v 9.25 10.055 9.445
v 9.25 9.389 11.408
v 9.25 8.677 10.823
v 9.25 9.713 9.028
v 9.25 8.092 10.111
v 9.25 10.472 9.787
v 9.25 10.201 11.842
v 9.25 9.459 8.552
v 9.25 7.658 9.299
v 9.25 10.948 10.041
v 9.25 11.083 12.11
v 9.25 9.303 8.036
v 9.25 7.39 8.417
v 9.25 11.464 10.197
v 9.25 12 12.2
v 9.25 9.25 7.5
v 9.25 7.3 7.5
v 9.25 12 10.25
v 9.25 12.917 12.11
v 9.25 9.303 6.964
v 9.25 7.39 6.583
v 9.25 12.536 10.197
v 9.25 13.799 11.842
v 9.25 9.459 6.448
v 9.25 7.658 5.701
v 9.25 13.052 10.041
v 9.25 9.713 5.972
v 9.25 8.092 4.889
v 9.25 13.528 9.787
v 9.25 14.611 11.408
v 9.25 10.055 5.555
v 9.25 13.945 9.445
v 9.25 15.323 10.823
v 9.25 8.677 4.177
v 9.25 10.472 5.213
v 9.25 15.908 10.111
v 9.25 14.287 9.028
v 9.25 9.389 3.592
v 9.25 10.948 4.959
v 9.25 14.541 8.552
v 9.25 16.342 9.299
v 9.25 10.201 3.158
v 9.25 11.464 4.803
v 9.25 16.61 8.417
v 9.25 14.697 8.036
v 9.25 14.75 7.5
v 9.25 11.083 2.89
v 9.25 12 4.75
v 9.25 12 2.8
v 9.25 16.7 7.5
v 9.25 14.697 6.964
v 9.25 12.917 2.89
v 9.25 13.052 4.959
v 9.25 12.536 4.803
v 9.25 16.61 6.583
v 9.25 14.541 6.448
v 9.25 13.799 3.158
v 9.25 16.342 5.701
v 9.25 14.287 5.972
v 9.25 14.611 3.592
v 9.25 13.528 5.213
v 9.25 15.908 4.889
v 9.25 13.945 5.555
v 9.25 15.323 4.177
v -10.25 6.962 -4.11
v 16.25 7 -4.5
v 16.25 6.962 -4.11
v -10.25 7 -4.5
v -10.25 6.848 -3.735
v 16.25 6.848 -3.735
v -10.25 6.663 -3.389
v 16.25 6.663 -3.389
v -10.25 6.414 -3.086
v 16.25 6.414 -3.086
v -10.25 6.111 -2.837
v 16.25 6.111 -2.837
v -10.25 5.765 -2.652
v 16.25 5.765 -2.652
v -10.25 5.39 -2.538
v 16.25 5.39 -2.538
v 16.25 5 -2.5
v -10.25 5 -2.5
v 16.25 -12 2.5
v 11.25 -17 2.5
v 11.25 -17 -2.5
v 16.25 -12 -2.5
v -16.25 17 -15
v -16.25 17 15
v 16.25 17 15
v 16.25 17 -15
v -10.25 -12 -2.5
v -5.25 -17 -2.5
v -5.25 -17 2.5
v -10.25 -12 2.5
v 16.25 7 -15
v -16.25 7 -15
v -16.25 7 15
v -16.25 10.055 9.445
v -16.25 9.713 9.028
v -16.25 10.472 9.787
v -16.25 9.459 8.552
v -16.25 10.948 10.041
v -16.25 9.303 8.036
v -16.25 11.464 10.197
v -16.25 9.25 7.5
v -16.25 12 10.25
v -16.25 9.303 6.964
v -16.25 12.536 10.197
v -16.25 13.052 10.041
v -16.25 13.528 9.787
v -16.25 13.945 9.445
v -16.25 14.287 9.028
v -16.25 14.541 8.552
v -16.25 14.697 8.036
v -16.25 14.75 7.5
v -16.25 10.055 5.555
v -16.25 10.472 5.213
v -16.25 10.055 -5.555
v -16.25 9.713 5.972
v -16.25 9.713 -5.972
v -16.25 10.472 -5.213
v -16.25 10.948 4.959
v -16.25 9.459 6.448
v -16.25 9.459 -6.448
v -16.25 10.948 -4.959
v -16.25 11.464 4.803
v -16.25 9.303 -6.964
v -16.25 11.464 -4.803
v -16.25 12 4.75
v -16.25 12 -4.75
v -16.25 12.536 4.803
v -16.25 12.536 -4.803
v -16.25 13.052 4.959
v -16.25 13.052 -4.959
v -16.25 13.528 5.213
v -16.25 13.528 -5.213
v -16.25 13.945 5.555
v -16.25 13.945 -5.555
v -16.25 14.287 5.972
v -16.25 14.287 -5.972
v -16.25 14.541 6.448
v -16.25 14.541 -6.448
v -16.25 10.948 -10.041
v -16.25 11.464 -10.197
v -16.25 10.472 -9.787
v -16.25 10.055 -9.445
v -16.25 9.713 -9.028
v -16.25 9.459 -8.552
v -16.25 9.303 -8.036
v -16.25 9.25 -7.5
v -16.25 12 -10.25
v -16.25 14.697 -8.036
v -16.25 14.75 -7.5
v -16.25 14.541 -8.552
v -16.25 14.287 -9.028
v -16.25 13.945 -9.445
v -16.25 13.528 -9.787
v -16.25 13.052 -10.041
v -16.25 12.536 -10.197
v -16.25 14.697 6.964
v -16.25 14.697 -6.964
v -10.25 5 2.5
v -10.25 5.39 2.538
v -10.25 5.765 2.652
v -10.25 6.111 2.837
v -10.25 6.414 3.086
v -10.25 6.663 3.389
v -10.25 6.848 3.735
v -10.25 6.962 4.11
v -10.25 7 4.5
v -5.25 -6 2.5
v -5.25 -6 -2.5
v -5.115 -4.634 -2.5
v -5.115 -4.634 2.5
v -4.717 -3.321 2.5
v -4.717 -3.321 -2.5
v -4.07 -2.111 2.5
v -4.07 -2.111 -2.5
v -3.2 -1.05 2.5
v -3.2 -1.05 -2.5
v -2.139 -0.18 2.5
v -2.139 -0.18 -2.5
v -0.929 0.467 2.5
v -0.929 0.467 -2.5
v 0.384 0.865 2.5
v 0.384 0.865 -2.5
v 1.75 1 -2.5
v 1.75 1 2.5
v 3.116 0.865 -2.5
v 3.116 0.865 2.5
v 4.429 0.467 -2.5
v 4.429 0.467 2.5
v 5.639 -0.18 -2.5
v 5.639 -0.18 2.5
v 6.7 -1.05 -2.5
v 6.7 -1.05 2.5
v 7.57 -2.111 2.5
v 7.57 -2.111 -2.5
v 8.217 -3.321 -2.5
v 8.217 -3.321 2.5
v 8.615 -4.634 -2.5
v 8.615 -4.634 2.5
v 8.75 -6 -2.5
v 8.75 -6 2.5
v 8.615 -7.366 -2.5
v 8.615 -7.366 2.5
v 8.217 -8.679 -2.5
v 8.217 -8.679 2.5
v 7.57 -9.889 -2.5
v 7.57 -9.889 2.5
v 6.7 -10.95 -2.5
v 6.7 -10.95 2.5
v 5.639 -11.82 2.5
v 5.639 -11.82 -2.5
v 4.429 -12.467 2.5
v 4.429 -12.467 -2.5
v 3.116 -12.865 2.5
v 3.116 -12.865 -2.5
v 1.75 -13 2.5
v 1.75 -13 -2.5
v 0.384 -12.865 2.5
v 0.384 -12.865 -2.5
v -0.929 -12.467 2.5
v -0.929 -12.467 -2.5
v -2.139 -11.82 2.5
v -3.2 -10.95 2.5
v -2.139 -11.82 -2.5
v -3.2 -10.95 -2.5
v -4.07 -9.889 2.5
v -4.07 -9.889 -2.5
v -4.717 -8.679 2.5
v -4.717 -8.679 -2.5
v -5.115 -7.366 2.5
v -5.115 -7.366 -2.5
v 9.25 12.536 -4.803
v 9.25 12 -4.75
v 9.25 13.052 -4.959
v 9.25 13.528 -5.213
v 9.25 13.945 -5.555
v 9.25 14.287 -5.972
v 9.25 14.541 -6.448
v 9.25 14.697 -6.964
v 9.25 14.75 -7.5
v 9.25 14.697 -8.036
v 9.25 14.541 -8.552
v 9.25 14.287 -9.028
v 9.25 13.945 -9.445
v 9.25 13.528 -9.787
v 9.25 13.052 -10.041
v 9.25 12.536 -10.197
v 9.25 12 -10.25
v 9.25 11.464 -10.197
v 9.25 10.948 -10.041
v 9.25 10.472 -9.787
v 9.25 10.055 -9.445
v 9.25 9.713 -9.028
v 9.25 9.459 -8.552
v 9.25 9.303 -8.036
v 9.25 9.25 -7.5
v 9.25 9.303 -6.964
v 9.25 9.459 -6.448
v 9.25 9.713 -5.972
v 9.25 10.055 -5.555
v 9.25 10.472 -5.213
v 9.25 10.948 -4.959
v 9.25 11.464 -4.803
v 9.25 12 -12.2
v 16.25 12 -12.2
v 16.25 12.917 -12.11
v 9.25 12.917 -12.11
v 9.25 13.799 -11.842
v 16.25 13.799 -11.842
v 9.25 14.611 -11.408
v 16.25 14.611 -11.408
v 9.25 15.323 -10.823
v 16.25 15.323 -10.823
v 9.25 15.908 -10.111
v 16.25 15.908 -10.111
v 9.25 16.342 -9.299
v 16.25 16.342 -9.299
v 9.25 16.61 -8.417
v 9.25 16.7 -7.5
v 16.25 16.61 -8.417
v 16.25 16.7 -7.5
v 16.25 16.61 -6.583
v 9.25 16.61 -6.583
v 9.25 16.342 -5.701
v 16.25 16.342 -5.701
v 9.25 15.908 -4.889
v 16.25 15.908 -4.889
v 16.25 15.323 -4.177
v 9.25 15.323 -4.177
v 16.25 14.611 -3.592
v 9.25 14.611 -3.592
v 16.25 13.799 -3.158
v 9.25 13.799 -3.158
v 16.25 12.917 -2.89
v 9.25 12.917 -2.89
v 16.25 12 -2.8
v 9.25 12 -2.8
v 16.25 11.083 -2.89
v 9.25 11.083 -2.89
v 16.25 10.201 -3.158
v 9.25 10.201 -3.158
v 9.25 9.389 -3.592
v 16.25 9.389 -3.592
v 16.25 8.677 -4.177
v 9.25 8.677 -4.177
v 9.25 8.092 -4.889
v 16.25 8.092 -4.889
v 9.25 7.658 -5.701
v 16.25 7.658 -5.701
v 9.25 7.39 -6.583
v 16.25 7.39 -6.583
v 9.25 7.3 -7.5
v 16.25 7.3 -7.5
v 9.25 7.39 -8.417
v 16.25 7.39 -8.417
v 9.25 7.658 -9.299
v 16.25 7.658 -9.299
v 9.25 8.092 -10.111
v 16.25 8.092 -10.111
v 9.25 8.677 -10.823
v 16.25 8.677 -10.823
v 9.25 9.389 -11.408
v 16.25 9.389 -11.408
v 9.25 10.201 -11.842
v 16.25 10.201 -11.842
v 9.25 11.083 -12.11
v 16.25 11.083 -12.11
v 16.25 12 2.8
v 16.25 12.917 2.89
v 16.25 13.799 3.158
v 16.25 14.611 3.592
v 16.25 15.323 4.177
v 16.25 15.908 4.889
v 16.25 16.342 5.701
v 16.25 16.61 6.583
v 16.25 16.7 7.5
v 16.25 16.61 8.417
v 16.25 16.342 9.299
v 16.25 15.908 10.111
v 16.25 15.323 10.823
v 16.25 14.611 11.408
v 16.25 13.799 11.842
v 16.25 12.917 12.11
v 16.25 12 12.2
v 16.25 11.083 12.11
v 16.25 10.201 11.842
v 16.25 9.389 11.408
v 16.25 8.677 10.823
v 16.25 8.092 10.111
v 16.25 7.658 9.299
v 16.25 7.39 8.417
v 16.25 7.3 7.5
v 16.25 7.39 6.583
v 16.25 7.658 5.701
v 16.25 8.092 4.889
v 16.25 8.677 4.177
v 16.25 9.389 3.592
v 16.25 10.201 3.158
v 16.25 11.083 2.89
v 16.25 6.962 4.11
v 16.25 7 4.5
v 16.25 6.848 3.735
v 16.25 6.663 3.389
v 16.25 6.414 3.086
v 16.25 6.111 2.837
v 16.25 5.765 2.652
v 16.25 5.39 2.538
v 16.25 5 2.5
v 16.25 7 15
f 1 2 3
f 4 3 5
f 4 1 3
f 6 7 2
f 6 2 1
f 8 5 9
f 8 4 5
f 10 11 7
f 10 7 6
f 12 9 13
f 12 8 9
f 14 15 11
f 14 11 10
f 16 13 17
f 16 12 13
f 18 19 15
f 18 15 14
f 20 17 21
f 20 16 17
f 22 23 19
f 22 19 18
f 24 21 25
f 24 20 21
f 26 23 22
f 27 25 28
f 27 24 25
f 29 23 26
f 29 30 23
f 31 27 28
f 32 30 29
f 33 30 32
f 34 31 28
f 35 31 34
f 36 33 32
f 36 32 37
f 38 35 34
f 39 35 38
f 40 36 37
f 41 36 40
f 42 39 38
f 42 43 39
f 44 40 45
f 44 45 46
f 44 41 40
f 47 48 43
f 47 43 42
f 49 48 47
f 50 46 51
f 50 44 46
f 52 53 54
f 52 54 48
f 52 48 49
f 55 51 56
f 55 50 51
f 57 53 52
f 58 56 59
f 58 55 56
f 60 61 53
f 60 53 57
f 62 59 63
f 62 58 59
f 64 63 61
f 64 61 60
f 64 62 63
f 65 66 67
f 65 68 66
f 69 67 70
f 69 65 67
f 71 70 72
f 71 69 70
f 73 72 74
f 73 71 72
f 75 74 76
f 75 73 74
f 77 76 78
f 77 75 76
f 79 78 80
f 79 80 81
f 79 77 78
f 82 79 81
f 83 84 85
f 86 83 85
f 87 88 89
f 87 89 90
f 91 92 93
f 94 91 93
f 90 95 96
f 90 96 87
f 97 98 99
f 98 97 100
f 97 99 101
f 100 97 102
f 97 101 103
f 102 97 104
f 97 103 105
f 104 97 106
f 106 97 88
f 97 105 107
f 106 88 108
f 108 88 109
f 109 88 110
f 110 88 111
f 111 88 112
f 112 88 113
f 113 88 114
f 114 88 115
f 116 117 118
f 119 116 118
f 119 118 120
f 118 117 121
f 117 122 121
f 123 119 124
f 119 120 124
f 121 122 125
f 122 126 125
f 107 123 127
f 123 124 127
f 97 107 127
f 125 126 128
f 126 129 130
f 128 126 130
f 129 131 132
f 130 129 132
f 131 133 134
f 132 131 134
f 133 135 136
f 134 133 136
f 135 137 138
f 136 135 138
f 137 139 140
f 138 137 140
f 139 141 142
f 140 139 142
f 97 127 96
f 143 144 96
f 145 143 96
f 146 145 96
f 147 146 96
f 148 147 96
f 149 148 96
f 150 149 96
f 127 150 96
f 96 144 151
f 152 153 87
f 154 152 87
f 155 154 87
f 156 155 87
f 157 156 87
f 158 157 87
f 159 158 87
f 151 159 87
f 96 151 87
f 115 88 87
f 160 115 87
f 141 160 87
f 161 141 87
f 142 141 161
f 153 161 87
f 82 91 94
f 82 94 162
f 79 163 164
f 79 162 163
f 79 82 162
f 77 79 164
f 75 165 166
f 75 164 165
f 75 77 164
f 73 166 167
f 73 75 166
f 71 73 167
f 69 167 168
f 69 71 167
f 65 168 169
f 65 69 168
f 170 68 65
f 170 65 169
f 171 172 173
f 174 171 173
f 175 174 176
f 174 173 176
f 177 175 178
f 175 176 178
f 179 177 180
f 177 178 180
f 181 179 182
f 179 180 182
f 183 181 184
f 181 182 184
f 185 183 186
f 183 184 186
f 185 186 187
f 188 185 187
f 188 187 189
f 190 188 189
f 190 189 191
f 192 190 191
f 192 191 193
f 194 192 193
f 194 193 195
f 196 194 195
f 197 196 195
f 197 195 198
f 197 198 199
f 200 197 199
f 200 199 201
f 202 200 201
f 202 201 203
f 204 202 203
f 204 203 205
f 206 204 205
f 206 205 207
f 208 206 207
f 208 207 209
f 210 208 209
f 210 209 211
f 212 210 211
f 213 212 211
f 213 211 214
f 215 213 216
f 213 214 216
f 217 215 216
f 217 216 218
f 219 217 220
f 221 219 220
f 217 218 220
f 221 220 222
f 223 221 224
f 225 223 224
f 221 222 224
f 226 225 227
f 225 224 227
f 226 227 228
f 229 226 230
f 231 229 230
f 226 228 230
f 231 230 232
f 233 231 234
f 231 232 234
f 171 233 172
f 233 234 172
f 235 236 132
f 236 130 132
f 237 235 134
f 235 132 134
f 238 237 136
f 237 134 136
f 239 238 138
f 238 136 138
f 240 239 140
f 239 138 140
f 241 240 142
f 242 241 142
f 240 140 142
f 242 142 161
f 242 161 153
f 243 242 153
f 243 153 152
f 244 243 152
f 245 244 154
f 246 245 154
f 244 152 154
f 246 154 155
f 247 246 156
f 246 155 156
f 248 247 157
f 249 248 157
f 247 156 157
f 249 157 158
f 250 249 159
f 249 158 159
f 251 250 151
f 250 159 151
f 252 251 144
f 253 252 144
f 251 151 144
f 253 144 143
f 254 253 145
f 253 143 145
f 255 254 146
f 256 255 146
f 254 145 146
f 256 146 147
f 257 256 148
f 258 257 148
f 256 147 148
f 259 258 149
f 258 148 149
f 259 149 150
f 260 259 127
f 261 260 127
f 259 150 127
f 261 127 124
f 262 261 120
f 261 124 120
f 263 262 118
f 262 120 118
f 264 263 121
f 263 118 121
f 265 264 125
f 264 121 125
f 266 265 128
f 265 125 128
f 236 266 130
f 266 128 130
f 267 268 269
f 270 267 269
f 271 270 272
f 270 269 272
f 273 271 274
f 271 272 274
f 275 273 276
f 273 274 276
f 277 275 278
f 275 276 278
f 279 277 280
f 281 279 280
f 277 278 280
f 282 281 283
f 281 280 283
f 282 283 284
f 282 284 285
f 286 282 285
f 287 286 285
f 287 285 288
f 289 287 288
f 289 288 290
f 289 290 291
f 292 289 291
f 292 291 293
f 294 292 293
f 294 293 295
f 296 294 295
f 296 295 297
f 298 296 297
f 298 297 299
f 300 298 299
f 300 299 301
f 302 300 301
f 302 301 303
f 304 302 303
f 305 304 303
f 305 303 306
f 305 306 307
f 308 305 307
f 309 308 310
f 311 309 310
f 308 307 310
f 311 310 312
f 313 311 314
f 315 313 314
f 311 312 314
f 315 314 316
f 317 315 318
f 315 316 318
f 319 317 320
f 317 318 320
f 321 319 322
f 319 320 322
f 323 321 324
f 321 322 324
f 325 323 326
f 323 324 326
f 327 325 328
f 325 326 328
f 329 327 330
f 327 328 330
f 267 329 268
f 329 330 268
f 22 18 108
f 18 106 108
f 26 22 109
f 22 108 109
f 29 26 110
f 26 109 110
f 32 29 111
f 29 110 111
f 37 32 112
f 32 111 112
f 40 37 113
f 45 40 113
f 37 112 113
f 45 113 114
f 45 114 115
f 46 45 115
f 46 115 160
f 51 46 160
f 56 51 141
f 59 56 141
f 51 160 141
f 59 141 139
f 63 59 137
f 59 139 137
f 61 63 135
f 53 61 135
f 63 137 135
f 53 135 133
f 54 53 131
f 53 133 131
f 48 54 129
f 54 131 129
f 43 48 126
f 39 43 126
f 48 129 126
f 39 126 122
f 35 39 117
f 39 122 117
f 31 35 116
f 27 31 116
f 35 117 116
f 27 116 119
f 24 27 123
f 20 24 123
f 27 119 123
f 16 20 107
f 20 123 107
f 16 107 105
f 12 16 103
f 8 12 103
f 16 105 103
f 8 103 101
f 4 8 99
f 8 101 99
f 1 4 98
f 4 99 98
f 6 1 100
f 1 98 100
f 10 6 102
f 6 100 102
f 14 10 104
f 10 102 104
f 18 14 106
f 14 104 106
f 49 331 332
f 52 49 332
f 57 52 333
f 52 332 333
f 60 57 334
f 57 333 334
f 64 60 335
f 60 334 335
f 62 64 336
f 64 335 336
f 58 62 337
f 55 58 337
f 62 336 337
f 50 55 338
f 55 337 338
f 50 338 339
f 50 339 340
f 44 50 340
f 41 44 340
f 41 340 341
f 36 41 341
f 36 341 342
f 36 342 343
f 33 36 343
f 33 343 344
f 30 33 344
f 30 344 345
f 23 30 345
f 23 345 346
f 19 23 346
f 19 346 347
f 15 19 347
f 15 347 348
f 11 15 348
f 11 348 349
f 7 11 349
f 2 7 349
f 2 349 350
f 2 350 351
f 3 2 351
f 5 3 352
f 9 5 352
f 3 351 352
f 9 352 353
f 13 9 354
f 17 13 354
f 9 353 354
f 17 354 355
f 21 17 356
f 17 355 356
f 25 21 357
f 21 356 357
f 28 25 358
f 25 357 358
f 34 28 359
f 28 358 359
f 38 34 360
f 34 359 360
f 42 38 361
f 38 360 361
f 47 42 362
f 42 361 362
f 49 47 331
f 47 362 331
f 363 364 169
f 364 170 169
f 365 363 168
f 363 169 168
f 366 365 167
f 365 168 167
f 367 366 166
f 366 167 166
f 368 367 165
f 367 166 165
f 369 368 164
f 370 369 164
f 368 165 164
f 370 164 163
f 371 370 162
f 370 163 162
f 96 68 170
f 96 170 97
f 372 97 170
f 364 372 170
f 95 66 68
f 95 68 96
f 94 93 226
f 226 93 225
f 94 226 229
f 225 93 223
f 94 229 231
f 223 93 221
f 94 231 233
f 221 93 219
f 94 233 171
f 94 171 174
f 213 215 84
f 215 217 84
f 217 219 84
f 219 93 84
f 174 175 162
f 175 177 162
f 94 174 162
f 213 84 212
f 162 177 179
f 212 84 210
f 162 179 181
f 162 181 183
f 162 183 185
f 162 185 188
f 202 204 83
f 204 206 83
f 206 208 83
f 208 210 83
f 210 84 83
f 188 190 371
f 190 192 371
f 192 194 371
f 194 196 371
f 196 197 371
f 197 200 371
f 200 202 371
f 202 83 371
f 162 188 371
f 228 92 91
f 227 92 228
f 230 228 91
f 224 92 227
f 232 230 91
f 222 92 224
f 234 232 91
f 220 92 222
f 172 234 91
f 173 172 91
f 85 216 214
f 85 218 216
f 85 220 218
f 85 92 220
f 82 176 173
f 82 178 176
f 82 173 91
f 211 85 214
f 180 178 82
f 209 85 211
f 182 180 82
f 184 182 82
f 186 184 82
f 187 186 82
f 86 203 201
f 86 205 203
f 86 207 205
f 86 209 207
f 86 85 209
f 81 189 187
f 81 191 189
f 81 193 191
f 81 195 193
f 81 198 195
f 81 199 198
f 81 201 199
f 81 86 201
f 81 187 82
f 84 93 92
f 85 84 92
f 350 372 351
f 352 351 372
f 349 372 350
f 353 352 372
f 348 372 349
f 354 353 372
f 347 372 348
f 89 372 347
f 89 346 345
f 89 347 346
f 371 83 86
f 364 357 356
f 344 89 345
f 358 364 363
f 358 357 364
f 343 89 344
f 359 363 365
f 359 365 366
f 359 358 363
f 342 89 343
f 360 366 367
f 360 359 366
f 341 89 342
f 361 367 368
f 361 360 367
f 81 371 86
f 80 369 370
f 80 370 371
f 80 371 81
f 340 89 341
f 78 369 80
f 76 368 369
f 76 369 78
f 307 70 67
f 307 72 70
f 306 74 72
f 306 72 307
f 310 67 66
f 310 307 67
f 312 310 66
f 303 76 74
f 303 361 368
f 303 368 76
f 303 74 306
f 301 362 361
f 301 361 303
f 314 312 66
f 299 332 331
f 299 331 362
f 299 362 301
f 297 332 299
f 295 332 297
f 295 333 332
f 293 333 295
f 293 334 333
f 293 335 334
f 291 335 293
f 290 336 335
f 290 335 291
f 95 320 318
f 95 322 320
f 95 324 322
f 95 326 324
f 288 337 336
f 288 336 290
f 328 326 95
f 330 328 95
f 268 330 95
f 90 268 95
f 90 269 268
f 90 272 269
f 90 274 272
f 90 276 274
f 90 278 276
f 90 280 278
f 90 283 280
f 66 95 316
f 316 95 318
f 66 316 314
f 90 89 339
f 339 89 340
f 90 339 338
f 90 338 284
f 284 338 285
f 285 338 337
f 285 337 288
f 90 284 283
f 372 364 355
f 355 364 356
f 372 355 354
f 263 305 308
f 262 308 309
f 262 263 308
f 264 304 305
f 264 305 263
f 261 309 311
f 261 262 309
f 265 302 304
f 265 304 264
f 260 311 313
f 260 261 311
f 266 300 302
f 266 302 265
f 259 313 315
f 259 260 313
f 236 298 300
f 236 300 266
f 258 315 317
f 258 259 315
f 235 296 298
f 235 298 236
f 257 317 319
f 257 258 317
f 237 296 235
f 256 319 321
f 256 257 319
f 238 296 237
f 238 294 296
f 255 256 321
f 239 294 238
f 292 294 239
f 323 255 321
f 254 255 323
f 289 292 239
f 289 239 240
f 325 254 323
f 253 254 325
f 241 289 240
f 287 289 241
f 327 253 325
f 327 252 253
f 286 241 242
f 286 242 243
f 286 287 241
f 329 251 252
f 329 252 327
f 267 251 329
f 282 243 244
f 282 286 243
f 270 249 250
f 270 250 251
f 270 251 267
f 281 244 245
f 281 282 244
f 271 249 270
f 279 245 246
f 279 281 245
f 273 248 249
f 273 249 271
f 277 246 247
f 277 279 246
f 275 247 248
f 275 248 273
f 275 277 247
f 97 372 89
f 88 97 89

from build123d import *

# Parameters (mm, degrees)
SKETCH_1_W                  = 30
SKETCH_1_H                  = 34
EXTRUDE_1_DEPTH             = 16.25
SKETCH_2_W                  = 12.5
SKETCH_2_H                  = 24
CUT_EXTRUDE_1_DEPTH         = 40.626380102
SKETCH_5_W                  = 6
SKETCH_5_H                  = 24
CUT_EXTRUDE_2_DEPTH         = 49.521258228
HOLE_WIZARD_1_D             = 14
HOLE_WIZARD_1_2_D           = 5.5
HOLE_WIZARD_1_2_CBORE_D     = 9.4
HOLE_WIZARD_1_2_CBORE_DEPTH = 7
FILLET_1_R                  = 2
CHAMFER_1_SIZE              = 5


with BuildPart() as part:
    # 草图1 → 凸台-拉伸1 (new, symmetric)
    with BuildSketch(Plane(origin=(0, 0, 0), x_dir=(0, 0, -1), z_dir=(1, 0, 0))):
        Rectangle(SKETCH_1_W, SKETCH_1_H)
    extrude(amount=EXTRUDE_1_DEPTH, both=True)

    # 草图2 → 切除-拉伸1 (cut, through all)
    with BuildSketch(Plane(origin=(16.25, 0, 0), x_dir=(0, 0, -1), z_dir=(1, 0, 0))):
        with Locations((8.75, -5)):
            Rectangle(SKETCH_2_W, SKETCH_2_H)
        with Locations((-8.75, -5)):
            Rectangle(SKETCH_2_W, SKETCH_2_H)
    extrude(amount=-CUT_EXTRUDE_1_DEPTH, mode=Mode.SUBTRACT)

    # 草图5 → 切除-拉伸2 (cut, through all)
    with BuildSketch(Plane(origin=(0, 17.5, -15), x_dir=(1, 0, 0), z_dir=(0, 0, 1))):
        with Locations((-13.25, -22.5)):
            Rectangle(SKETCH_5_W, SKETCH_5_H)
    extrude(amount=CUT_EXTRUDE_2_DEPTH, mode=Mode.SUBTRACT)

    # Hole Wizard 1 (through all)
    with Locations(Plane.XY.offset(15)):
        with Locations((1.75, -6)):
            Hole(HOLE_WIZARD_1_D / 2)

    # Hole Wizard 1 2 (through all)
    with Locations(Plane(origin=(16.25, 0, 0), x_dir=(0, 0, -1), z_dir=(1, 0, 0))):
        with Locations((7.5, 12), (-7.5, 12)):
            CounterBoreHole(HOLE_WIZARD_1_2_D / 2, HOLE_WIZARD_1_2_CBORE_D / 2, HOLE_WIZARD_1_2_CBORE_DEPTH)

    # 圆角1
    fillet_1_edges = [part.edges().sort_by_distance(p)[0] for p in [
        (3, 7, 2.5),
        (3, 7, -2.5),
    ]]
    fillet(fillet_1_edges, radius=FILLET_1_R)

    # 倒角1
    chamfer_1_edges = [part.edges().sort_by_distance(p)[0] for p in [
        (16.25, -17, 0),
        (-10.25, -17, 0),
    ]]
    chamfer(chamfer_1_edges, length=CHAMFER_1_SIZE)


solid = part.part
